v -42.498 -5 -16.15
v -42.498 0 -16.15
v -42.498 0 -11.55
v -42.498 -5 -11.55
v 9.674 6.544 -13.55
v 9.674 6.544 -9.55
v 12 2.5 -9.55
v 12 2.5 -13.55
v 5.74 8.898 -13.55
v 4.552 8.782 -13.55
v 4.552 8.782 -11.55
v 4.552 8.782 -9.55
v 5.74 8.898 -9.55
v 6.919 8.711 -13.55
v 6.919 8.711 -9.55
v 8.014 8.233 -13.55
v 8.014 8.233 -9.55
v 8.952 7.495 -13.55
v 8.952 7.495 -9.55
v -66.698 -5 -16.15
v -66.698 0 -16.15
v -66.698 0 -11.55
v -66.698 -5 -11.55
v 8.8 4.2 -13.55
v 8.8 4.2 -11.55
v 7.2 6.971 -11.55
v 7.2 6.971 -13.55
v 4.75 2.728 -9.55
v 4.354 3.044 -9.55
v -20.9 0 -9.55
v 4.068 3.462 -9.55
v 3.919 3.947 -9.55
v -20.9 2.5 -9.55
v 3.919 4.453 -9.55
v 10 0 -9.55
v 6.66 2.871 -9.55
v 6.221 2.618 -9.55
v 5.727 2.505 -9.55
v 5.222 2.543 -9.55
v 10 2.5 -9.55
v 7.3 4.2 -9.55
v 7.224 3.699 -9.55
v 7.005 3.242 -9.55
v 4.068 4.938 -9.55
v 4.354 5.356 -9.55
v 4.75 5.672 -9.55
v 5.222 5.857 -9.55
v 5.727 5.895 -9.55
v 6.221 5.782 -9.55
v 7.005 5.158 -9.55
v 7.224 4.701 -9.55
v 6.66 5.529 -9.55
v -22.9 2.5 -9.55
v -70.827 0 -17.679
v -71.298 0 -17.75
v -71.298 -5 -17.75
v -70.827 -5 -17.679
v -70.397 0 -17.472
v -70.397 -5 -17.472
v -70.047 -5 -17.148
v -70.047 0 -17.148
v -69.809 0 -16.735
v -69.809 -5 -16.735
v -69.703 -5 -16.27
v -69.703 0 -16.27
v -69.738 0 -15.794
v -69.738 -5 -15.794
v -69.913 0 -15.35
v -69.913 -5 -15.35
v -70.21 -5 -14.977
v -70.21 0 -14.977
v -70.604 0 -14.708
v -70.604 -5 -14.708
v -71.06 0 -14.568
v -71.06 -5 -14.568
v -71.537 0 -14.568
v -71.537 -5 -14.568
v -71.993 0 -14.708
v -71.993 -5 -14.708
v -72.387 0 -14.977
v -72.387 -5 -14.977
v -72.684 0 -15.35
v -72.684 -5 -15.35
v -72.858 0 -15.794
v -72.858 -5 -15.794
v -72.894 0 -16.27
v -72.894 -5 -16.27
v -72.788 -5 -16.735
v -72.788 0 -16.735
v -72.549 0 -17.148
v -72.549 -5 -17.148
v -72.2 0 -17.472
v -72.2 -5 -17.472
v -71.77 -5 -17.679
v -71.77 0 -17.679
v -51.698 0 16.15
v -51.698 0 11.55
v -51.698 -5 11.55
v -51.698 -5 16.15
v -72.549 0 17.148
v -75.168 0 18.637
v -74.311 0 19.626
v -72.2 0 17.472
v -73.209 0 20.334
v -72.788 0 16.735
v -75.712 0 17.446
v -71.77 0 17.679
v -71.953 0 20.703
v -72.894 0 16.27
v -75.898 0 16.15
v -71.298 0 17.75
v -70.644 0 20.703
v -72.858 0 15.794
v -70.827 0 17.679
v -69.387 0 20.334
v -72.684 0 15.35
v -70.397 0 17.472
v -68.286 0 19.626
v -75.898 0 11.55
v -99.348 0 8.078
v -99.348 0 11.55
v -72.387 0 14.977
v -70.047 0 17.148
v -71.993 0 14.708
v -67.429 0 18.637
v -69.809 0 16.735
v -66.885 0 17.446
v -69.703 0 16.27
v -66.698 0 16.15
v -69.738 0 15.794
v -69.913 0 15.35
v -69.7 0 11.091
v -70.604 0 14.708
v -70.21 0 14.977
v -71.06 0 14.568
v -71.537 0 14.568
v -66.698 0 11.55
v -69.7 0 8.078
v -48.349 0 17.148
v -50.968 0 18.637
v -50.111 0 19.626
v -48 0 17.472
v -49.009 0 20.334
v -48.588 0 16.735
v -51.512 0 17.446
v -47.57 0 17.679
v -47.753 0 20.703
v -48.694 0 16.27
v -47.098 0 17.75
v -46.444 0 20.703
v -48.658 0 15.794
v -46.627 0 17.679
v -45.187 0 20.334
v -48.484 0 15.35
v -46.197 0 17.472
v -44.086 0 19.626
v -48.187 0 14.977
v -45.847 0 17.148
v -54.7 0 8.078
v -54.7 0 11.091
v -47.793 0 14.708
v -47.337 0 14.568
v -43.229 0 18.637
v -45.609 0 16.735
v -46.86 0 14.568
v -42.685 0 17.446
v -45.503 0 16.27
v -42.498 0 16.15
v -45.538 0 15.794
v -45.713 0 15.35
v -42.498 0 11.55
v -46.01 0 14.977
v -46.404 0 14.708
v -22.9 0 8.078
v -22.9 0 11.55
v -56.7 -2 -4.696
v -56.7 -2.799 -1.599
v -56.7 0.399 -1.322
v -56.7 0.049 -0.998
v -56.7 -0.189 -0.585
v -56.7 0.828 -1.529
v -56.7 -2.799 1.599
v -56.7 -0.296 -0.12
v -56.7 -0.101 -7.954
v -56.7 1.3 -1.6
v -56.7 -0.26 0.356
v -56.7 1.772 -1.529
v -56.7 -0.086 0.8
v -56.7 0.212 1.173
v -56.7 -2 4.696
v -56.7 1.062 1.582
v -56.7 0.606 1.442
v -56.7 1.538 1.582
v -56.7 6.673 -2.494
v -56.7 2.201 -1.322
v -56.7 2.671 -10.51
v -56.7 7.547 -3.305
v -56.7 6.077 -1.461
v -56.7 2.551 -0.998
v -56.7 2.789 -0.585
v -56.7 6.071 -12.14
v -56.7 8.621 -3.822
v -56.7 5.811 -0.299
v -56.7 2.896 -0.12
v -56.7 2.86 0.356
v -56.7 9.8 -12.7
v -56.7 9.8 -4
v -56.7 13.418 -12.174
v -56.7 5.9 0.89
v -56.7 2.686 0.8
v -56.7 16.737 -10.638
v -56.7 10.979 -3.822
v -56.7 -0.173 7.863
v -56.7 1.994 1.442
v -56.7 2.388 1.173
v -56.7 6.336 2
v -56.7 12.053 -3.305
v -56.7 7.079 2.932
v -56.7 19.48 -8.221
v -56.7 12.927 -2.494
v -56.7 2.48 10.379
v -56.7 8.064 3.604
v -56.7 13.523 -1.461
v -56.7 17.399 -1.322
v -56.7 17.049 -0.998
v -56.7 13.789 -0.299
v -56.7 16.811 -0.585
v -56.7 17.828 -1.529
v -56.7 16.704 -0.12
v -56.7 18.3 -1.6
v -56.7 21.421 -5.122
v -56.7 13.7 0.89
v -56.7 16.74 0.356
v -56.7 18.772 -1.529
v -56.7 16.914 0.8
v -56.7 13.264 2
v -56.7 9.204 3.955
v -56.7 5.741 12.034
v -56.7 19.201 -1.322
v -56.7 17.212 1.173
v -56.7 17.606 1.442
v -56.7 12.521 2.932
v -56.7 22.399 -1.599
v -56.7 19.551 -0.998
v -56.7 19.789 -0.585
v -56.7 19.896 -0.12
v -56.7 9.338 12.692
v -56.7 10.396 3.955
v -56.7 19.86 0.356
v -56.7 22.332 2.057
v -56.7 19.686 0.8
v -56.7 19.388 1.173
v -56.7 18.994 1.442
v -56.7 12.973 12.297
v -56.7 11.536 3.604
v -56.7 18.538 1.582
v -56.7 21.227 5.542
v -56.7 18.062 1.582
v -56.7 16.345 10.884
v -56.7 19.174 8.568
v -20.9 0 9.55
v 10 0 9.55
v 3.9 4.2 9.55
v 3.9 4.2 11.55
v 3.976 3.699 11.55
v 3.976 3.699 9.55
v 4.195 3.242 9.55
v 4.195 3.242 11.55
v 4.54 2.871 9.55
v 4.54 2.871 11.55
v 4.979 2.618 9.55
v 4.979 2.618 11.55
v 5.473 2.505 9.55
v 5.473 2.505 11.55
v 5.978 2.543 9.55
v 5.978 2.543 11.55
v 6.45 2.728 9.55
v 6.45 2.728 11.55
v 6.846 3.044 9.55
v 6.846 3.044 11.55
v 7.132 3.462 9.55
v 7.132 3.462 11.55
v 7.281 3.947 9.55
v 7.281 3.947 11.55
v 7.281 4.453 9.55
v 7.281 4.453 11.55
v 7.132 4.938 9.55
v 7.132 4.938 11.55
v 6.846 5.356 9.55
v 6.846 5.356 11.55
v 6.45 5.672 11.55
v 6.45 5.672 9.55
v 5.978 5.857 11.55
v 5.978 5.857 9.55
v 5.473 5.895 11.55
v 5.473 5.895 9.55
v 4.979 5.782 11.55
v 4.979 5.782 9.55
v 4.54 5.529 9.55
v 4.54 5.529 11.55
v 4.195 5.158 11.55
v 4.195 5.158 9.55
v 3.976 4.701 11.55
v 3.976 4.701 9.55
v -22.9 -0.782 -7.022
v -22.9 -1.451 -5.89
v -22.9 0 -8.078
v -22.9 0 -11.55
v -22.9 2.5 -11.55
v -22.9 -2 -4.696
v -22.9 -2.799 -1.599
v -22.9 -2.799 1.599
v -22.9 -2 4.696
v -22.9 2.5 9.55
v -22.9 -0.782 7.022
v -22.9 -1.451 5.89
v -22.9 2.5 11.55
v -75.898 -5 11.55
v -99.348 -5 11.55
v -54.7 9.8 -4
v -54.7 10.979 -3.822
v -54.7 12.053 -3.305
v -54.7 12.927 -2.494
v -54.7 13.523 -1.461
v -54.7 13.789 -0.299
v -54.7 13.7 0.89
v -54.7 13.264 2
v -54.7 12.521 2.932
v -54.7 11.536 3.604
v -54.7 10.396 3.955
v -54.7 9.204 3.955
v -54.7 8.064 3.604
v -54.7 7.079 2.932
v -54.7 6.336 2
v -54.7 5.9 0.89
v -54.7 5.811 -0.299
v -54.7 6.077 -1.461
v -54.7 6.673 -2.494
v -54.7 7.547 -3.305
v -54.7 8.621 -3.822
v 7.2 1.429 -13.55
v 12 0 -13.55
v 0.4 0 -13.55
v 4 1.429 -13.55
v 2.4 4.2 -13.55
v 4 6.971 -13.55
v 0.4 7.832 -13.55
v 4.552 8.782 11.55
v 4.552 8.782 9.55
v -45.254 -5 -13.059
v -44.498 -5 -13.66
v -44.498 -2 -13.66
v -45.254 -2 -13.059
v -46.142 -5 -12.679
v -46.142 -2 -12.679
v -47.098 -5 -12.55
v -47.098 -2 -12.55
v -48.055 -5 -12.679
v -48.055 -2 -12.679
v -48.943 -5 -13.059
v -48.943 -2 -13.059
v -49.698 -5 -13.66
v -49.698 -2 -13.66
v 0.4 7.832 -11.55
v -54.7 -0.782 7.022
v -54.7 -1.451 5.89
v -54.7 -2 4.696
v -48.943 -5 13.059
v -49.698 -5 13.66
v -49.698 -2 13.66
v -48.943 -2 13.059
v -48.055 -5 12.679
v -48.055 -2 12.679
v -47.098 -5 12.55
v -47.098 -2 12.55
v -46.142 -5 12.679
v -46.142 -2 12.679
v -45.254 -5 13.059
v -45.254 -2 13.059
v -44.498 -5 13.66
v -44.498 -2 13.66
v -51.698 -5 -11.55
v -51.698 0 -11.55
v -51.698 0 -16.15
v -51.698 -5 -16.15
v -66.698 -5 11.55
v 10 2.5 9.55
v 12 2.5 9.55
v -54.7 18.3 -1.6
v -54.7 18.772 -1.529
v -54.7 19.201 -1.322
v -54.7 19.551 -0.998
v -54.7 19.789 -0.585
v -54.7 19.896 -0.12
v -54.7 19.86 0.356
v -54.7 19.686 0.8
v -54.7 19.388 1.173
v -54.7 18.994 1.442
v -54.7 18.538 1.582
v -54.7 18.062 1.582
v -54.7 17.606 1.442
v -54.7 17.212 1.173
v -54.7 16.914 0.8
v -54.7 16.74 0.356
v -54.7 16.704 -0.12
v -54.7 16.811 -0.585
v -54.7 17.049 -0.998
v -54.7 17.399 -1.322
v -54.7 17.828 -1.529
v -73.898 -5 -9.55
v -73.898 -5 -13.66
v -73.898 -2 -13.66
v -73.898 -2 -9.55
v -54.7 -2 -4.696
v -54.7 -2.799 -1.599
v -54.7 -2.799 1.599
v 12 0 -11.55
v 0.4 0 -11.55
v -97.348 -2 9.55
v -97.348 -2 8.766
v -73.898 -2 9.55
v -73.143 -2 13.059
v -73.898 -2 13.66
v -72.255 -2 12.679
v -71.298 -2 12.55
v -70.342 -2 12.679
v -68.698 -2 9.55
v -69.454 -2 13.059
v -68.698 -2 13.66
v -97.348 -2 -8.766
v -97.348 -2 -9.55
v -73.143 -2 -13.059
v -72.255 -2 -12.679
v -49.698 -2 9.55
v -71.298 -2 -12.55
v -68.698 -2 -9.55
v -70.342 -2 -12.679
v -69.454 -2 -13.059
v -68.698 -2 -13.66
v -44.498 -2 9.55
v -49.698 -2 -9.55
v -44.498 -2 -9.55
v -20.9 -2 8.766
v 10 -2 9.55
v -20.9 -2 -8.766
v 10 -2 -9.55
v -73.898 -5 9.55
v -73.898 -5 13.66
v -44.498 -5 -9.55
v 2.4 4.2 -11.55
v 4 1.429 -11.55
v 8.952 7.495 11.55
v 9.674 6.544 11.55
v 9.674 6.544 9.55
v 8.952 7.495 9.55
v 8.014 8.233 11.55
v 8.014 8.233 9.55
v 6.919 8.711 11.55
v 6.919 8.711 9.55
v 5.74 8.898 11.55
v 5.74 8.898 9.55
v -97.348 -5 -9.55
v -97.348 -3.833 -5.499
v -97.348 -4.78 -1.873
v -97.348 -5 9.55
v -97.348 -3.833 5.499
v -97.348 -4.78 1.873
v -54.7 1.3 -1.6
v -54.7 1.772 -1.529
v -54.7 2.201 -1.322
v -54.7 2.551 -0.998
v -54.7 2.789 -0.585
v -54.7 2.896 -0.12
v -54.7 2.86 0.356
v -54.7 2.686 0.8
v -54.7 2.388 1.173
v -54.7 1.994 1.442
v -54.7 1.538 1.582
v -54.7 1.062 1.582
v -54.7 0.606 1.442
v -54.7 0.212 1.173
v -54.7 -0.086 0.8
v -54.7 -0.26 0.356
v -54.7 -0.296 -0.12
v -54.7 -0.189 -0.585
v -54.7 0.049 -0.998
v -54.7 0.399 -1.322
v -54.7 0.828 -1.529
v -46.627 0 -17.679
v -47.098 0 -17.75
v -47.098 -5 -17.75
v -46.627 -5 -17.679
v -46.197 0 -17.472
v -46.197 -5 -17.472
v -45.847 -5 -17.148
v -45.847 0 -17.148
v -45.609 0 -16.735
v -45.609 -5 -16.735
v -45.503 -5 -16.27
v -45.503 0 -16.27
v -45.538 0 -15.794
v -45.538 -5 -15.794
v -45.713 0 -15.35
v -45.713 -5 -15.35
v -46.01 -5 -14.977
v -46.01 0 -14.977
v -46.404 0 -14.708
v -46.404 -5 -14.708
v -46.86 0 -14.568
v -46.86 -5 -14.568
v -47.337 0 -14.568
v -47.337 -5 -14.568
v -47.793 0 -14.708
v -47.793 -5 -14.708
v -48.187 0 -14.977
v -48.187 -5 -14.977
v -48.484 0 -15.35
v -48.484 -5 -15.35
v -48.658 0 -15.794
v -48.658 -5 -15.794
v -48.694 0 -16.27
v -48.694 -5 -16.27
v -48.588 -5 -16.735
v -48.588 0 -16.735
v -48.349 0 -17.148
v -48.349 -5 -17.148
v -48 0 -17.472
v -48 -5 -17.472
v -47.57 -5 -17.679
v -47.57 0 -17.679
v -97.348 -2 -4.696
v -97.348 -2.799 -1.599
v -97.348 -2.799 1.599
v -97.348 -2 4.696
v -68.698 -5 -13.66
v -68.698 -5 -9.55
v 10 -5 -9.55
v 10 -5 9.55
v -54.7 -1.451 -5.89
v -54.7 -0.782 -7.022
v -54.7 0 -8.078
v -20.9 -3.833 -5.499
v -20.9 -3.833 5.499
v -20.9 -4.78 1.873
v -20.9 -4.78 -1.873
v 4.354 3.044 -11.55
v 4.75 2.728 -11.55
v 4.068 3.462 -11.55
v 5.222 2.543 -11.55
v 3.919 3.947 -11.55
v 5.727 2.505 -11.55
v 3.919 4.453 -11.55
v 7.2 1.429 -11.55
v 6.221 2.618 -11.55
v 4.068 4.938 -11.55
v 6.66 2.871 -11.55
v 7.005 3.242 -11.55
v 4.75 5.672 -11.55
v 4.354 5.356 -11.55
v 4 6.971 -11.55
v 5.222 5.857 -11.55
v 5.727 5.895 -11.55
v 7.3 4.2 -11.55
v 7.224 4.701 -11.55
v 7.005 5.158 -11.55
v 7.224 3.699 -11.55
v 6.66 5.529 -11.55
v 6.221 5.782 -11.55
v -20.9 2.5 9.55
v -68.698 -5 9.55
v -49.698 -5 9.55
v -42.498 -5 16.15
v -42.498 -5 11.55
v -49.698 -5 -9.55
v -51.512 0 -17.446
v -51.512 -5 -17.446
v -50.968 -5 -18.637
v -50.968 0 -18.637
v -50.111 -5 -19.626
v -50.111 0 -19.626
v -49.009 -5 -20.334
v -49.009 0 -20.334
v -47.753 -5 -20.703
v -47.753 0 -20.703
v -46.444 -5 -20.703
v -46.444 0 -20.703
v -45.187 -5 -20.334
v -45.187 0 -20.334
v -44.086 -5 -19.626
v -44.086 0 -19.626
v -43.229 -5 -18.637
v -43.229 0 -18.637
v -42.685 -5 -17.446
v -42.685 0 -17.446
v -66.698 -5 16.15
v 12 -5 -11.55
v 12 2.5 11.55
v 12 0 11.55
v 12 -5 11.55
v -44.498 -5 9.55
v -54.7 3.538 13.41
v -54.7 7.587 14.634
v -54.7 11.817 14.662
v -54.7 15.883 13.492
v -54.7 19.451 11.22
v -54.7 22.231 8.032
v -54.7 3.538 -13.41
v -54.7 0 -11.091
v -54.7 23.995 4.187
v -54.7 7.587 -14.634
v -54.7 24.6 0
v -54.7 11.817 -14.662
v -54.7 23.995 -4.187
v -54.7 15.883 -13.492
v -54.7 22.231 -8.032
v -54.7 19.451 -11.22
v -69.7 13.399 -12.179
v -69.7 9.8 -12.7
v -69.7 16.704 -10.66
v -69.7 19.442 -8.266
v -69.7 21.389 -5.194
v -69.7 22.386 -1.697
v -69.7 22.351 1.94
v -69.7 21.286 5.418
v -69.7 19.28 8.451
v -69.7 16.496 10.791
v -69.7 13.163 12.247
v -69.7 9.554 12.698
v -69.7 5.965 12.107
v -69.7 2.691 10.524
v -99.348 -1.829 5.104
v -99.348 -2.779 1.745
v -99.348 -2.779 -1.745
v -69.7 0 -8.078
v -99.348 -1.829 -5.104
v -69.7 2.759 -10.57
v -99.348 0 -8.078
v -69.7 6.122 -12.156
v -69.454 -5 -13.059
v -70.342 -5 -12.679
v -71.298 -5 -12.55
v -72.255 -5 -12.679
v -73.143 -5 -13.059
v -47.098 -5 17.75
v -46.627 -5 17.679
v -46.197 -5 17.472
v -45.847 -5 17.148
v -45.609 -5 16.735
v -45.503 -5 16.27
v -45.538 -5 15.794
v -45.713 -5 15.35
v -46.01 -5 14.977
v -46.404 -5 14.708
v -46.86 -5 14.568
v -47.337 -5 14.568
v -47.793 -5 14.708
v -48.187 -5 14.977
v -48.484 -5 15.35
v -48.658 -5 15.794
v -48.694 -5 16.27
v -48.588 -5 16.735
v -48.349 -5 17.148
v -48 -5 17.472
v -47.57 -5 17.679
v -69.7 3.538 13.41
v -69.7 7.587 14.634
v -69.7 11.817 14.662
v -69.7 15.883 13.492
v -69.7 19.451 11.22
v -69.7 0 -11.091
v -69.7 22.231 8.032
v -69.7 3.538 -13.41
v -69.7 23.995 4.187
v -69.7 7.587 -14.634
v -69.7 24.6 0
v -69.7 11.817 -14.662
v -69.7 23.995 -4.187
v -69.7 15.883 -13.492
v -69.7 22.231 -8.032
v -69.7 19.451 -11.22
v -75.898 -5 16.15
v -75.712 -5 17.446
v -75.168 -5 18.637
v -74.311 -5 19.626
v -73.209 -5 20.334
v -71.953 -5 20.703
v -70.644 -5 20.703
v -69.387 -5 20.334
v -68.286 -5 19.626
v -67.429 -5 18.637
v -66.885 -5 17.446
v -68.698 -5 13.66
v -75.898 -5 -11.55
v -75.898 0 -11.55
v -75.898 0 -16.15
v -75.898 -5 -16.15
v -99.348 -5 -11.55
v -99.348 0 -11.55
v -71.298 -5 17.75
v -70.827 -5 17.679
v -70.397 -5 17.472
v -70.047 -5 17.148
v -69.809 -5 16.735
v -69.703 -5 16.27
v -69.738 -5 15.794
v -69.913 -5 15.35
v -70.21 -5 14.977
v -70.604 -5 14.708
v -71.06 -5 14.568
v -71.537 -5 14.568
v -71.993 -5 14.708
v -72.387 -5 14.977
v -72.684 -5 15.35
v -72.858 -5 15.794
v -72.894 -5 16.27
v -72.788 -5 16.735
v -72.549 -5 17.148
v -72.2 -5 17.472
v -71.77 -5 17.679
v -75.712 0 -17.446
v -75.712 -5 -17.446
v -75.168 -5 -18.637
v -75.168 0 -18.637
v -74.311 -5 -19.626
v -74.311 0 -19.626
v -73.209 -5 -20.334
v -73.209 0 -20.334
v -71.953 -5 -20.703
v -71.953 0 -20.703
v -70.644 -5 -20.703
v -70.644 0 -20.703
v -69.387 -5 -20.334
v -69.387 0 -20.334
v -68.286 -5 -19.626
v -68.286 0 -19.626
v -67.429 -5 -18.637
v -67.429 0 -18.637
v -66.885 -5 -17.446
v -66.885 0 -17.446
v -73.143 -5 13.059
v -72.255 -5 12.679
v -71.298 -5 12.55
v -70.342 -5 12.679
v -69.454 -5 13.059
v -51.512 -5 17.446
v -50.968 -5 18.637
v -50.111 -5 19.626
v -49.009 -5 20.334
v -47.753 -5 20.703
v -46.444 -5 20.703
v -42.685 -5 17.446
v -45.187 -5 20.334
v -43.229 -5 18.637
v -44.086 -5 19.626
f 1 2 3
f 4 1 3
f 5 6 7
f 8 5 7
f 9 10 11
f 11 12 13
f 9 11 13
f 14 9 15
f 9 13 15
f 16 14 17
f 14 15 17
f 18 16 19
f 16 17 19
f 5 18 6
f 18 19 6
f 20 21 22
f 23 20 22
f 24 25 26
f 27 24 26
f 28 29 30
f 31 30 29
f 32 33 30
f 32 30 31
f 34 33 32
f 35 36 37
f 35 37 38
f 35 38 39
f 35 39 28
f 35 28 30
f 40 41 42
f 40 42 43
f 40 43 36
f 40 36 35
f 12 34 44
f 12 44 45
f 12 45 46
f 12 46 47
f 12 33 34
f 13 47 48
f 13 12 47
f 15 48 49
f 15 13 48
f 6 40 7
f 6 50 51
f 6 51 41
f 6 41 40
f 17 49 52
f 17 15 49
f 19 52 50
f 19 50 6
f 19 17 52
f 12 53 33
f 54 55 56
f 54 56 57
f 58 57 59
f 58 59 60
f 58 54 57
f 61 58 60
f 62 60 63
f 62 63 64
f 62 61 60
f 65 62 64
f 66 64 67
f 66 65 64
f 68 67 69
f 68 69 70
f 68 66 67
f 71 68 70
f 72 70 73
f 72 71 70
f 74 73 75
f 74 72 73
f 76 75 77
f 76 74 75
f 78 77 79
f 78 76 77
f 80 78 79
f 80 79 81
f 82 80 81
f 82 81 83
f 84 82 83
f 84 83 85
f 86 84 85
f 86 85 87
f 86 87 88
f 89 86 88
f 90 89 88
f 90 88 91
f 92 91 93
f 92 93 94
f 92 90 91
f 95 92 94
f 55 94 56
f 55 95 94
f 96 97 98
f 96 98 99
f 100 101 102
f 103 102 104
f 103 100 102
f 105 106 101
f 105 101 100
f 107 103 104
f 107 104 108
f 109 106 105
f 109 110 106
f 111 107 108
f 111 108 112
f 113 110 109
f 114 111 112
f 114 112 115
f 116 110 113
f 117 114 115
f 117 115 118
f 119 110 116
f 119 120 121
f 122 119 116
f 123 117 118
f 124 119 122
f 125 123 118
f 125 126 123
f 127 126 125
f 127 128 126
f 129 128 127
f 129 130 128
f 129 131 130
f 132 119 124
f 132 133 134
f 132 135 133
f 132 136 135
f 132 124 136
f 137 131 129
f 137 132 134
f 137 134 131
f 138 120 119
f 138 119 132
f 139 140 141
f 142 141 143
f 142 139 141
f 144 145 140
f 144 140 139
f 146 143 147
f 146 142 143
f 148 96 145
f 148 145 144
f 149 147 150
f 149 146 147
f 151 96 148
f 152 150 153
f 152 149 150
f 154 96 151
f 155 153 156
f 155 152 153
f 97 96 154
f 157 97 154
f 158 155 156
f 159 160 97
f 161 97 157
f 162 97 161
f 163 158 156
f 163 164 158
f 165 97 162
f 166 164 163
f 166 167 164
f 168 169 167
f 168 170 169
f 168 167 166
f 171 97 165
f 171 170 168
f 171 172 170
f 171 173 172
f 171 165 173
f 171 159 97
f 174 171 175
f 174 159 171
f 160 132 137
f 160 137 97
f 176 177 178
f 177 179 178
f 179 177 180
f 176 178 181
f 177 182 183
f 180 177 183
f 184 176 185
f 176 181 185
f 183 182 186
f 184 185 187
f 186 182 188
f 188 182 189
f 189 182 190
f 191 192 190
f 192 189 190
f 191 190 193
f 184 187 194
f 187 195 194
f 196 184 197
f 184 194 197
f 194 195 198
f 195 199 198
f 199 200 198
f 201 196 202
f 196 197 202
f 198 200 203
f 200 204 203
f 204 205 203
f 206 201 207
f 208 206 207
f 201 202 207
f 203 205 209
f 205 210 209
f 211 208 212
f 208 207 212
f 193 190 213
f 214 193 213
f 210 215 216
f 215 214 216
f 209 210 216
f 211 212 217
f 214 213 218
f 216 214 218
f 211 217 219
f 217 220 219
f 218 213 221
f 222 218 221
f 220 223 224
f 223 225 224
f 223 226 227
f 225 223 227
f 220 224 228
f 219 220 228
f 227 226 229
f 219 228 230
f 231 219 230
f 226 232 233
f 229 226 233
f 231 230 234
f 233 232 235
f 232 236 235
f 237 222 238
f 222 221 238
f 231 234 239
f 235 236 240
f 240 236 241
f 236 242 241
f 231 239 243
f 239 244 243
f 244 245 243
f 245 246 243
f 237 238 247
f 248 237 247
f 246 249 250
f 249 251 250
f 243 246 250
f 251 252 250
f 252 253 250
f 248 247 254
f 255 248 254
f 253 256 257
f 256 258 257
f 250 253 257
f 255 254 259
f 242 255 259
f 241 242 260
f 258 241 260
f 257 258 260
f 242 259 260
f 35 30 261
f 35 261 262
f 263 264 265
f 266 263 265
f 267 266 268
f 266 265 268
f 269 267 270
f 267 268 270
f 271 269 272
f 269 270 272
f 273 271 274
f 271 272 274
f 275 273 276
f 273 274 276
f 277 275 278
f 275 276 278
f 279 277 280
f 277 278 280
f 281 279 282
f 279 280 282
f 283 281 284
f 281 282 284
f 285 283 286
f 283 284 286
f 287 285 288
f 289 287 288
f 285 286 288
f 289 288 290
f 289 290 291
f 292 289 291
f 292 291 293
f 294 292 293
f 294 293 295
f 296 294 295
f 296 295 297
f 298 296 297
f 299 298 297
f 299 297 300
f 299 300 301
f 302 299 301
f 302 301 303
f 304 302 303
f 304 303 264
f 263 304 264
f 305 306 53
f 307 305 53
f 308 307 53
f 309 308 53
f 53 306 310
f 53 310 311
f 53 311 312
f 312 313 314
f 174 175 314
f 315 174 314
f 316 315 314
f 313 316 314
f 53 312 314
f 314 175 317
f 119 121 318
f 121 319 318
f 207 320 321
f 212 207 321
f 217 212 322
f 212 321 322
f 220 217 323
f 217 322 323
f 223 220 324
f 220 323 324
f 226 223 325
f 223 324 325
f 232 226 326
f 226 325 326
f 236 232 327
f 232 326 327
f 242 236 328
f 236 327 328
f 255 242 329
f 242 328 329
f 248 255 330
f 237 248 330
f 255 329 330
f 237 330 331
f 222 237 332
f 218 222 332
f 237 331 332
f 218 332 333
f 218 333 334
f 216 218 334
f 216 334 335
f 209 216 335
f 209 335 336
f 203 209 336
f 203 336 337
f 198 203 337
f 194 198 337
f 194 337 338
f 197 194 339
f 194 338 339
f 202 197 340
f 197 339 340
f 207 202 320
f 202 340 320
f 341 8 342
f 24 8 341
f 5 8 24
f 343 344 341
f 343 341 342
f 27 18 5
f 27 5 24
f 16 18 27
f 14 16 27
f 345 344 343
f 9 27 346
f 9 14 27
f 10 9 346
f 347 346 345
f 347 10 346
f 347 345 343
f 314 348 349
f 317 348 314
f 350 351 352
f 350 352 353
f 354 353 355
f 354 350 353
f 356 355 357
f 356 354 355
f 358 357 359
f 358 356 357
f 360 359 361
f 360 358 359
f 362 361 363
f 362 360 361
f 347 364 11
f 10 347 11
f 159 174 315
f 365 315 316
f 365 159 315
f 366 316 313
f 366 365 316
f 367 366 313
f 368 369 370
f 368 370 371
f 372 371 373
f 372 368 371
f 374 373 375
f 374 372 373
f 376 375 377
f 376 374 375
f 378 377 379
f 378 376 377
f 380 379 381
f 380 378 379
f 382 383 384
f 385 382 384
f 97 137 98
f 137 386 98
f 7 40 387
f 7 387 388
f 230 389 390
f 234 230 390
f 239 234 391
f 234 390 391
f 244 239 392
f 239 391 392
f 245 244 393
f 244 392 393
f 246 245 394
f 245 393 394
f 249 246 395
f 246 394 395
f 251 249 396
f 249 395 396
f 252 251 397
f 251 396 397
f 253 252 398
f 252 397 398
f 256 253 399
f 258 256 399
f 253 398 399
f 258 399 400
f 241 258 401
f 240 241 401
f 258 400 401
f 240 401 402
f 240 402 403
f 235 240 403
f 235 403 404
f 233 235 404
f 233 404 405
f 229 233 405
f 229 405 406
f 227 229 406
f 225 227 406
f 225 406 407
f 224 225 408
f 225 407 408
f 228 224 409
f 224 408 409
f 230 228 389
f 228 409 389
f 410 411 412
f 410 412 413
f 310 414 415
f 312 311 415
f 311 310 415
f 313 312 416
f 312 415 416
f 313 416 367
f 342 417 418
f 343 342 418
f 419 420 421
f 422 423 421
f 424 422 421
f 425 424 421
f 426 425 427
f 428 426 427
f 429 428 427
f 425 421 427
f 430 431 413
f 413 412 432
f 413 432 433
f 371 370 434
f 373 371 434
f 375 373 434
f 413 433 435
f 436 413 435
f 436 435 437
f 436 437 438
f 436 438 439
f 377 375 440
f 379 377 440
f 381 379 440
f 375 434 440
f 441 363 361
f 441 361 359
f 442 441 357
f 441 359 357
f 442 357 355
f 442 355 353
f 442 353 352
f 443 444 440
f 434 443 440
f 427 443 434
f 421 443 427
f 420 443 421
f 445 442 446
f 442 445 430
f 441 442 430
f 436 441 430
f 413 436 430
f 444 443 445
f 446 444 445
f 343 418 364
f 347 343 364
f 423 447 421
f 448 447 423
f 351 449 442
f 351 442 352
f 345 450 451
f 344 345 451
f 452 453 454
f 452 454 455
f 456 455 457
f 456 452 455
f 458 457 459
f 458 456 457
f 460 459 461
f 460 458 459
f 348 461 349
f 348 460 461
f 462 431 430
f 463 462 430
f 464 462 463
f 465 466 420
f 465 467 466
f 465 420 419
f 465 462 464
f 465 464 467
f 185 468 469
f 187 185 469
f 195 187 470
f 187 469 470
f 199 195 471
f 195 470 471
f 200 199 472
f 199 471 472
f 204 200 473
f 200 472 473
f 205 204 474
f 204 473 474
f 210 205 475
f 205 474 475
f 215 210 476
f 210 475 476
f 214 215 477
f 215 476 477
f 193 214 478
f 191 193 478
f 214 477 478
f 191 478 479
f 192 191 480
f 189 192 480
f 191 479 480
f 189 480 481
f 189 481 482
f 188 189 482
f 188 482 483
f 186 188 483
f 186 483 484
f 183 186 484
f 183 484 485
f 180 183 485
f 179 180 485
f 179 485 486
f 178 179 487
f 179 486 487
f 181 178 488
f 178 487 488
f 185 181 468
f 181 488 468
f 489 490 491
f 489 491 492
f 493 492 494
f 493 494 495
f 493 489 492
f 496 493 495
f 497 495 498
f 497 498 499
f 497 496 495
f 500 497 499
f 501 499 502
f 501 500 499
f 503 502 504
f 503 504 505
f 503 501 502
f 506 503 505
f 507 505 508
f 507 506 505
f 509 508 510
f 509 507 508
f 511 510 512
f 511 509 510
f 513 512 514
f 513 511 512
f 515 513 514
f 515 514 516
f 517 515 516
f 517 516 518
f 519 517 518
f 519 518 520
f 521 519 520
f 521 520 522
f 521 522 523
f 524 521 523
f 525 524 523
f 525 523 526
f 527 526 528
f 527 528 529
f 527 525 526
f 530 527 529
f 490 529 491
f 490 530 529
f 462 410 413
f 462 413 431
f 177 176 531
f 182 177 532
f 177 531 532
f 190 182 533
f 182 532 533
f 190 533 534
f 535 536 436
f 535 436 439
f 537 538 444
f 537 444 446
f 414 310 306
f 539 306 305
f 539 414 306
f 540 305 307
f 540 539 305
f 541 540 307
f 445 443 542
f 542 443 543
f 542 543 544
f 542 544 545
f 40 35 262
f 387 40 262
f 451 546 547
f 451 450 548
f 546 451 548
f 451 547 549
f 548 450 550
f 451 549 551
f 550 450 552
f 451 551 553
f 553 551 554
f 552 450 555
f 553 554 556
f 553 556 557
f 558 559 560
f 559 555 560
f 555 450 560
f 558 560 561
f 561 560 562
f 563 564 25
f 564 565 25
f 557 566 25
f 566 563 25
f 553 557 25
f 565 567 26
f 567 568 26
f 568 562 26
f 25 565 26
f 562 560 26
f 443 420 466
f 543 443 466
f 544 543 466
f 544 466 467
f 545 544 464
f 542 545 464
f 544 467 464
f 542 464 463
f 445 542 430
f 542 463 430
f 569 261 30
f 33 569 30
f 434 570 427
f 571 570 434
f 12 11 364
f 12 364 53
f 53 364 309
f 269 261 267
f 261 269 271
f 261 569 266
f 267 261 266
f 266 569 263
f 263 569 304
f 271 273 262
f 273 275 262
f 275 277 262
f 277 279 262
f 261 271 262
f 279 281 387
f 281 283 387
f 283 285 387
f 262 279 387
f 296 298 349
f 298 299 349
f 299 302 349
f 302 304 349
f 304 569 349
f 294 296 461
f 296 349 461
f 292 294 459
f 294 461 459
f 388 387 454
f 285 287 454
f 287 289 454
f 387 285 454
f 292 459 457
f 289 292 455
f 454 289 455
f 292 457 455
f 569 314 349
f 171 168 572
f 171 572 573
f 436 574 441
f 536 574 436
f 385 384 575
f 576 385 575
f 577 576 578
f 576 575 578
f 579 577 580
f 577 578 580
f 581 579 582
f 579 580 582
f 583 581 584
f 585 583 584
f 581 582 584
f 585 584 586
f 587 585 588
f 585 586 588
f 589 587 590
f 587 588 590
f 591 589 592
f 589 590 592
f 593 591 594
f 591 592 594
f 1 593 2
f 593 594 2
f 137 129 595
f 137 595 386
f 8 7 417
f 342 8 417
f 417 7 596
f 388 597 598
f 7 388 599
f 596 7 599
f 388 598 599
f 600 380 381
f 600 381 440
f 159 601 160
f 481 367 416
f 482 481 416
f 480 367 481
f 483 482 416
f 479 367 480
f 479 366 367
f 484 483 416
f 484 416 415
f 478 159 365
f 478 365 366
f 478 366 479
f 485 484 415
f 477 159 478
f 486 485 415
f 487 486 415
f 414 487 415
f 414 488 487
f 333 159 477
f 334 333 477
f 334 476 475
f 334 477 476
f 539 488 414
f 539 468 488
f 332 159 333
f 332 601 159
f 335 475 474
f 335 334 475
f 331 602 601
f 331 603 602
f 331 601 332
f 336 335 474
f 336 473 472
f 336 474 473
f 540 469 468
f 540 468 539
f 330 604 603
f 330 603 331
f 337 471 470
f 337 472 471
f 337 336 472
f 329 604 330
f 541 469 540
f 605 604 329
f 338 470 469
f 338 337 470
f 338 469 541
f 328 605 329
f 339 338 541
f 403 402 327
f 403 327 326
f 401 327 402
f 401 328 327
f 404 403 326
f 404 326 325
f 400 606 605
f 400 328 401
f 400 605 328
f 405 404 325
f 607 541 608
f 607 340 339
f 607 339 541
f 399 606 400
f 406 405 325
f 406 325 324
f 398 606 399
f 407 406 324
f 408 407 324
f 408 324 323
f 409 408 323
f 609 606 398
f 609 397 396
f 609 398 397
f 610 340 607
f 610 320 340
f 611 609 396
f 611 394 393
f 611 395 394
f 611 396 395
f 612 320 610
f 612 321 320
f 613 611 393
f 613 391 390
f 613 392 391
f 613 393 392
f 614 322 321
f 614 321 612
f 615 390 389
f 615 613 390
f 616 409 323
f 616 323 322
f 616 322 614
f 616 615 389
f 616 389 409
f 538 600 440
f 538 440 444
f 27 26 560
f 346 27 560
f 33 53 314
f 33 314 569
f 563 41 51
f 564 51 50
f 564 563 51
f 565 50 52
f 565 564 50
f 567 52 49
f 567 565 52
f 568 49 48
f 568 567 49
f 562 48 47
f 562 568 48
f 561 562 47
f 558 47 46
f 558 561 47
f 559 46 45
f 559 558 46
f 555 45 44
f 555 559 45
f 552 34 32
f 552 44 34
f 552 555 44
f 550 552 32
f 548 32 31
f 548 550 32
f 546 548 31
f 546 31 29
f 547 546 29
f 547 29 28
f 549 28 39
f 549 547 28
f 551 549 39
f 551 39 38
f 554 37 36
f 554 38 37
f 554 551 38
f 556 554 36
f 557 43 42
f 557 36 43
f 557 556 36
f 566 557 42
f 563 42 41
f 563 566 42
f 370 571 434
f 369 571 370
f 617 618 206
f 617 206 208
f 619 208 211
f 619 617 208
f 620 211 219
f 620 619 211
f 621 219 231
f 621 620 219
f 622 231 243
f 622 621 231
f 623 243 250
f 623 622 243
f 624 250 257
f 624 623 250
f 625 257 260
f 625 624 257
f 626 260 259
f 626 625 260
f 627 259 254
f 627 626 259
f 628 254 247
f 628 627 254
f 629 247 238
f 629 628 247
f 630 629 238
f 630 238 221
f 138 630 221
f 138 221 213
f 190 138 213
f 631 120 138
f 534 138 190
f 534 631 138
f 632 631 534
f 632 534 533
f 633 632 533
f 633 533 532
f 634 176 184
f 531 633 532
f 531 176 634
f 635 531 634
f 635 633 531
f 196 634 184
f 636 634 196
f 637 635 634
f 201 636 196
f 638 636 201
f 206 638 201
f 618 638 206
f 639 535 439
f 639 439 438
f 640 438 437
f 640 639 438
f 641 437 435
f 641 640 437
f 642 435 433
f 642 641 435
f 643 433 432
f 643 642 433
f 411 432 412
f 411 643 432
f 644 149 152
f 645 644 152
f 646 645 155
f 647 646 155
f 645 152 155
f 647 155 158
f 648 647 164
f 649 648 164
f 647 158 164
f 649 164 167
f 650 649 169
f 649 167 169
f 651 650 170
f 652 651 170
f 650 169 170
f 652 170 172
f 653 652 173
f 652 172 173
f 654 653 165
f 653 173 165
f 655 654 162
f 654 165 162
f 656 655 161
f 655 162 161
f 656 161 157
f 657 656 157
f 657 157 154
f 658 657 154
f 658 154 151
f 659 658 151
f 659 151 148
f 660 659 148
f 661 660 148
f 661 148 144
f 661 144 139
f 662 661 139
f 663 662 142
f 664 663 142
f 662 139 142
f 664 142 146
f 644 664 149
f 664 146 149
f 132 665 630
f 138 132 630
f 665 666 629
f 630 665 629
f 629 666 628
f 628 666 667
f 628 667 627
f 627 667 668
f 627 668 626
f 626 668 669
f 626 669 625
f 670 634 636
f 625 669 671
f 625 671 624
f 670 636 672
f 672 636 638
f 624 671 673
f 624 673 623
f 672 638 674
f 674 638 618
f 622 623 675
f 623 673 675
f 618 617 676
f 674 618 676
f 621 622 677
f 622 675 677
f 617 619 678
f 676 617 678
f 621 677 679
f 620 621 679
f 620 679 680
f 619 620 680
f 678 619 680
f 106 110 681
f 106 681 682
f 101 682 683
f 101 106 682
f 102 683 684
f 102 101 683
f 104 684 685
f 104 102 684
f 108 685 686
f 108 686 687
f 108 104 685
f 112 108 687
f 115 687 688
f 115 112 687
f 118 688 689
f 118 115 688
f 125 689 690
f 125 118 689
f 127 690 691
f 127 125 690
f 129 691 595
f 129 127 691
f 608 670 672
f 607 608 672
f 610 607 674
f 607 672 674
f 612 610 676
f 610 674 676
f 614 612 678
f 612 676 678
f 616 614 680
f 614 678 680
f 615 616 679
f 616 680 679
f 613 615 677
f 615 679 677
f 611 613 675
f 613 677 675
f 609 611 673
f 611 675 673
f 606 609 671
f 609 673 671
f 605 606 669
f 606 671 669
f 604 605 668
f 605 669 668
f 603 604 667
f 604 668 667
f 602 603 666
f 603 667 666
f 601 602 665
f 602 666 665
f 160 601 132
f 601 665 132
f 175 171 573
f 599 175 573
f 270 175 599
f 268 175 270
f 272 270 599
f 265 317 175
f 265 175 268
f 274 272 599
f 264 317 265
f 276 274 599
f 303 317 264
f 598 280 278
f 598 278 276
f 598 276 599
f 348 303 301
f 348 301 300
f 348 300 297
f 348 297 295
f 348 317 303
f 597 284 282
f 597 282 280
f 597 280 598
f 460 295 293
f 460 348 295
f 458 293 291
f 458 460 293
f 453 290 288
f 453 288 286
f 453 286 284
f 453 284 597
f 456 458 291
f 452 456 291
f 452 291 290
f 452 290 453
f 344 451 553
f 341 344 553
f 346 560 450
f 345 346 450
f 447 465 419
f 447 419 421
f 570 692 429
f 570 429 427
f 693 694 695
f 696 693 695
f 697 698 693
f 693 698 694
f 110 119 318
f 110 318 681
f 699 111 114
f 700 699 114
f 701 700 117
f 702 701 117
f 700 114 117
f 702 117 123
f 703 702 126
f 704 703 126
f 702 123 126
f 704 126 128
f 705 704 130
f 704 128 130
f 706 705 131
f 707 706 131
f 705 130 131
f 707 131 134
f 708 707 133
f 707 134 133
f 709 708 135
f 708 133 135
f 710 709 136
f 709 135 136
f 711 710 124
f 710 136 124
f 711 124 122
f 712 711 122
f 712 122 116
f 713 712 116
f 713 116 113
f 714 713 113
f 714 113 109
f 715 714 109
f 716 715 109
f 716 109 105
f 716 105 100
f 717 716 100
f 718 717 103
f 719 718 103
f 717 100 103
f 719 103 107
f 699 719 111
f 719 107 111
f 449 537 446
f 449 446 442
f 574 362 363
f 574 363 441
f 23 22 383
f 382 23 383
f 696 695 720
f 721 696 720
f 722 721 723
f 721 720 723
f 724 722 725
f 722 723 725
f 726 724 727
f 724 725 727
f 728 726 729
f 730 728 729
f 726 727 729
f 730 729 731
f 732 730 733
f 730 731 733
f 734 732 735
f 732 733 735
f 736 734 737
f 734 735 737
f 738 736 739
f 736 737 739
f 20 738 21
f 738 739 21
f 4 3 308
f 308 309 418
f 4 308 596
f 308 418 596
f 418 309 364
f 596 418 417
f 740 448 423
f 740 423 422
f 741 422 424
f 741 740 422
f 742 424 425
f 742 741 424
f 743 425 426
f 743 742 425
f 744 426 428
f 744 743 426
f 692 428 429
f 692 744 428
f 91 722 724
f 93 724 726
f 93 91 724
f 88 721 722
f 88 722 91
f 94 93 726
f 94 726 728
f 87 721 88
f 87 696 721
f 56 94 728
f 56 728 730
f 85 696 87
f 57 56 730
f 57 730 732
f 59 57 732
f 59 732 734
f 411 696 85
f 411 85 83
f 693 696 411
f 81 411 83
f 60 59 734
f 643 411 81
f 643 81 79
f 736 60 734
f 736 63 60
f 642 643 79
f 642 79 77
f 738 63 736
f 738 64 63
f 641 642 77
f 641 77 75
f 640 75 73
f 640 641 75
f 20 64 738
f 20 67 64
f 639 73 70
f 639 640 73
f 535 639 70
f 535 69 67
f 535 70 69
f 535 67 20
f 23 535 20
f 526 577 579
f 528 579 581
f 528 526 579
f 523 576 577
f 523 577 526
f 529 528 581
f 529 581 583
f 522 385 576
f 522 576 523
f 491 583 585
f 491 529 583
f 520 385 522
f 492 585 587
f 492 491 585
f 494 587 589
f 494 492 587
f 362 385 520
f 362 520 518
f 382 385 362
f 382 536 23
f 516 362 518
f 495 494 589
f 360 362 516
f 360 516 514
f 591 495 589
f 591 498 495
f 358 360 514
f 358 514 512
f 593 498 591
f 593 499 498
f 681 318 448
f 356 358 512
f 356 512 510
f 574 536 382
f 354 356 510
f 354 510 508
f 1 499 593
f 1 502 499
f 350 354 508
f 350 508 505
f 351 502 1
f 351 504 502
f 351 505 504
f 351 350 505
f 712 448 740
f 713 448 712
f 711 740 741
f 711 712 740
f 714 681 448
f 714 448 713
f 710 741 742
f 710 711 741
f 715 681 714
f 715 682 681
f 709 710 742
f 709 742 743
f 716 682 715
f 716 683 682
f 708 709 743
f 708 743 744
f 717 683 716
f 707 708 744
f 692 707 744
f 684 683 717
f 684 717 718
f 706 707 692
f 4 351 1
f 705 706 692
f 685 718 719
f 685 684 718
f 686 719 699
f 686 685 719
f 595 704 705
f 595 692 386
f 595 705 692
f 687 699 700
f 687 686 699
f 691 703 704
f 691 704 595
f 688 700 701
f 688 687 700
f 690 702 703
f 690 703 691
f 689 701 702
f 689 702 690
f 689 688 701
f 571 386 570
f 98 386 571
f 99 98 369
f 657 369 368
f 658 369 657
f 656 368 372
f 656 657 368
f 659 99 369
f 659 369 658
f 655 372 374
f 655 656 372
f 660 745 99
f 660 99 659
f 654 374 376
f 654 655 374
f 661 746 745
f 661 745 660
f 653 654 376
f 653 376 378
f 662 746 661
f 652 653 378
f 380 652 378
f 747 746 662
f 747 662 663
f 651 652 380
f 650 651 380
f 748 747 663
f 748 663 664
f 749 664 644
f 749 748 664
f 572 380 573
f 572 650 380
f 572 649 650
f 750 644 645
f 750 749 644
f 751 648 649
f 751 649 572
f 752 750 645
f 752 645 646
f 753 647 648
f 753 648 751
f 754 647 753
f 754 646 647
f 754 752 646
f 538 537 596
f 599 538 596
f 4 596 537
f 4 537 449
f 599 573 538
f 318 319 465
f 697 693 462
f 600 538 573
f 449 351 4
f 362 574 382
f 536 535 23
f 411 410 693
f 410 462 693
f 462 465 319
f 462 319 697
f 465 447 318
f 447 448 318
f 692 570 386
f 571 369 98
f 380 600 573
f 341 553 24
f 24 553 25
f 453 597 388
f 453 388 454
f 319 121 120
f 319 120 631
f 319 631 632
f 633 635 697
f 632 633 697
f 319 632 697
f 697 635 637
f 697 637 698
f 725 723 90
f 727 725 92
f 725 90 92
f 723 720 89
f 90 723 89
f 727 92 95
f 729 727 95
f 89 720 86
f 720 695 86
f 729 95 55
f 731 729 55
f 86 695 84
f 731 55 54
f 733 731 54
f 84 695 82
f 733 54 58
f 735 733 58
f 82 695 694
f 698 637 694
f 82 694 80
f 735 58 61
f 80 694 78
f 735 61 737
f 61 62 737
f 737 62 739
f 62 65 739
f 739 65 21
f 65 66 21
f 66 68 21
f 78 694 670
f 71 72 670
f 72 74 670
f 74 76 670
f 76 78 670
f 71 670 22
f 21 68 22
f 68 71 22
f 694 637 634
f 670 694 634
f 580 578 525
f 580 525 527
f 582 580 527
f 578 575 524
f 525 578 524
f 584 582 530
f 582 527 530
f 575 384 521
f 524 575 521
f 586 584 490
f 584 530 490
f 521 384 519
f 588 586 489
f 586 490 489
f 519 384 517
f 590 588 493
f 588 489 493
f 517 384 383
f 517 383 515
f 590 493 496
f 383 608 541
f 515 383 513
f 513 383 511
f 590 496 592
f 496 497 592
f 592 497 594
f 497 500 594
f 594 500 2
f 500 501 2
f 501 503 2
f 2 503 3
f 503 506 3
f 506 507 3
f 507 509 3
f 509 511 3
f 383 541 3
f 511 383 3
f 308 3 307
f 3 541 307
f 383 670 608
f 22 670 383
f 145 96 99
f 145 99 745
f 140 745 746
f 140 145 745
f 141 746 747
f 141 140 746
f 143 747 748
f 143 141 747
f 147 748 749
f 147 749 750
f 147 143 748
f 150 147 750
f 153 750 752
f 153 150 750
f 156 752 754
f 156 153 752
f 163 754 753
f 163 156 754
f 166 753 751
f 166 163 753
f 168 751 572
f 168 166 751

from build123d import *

# Parameters (mm, degrees)
SKETCH3_W                = 111.348371095
SKETCH3_H                = 23.1
BOSS_EXTRUDE1_DEPTH      = 5
SKETCH3_4_W              = 34.9
SKETCH3_4_H              = 23.1
BOSS_EXTRUDE2_DEPTH      = 2.5
CUT_EXTRUDE1_DEPTH       = 30.8
CUT_EXTRUDE1_DEPTH_BACK  = 67.894637304
SKETCH4_4_R              = 12.7
BOSS_EXTRUDE3_START      = -1
SKETCH4_R                = 12.7
SKETCH4_R_2              = 4
SKETCH4_R_3              = 1.6
BOSS_EXTRUDE3_DEPTH      = 2
BOSS_EXTRUDE4_DEPTH      = 2
BOSS_EXTRUDE4_DEPTH_BACK = 13
BOSS_EXTRUDE4_START      = -3
SKETCH4_3_R              = 14.8
SKETCH4_3_R_2            = 12.7
SKETCH5_R                = 4.6
SKETCH5_R_2              = 1.6
BOSS_EXTRUDE5_DEPTH      = 5
BOSS_EXTRUDE6_START      = 11.55
SKETCH6_R                = 1.7
BOSS_EXTRUDE6_DEPTH      = 2
BOSS_EXTRUDE7_START      = -11.55
BOSS_EXTRUDE7_OUTLINE_R  = 1.7
BOSS_EXTRUDE7_DEPTH      = 2
BOSS_EXTRUDE8_DEPTH      = 2
SHELL1_START             = -5
SHELL1_DEPTH             = 0.1
SHELL1_START_2           = -4.9
SHELL1_2_DEPTH           = 2.9
SHELL1_START_3           = -97.348371095
SHELL1_3_DEPTH           = 76.448371095
SHELL1_START_4           = -56.7
SHELL1_4_DEPTH           = 2
SHELL1_START_5           = -22.9
SHELL1_5_DEPTH           = 2


with BuildPart() as part:
    # Sketch3 → Boss-Extrude1 (new body)
    with BuildSketch(Plane(origin=(0, 0, 0), x_dir=(1, 0, 0), z_dir=(0, 1, 0))):
        with Locations((-43.674185548, 0)):
            Rectangle(SKETCH3_W, SKETCH3_H)
    extrude(amount=-BOSS_EXTRUDE1_DEPTH)

    # Sketch3<4> → Boss-Extrude2 (add)
    with BuildSketch(Plane(origin=(0, 0, 0), x_dir=(1, 0, 0), z_dir=(0, 1, 0))):
        with Locations((-5.45, 0)):
            Rectangle(SKETCH3_4_W, SKETCH3_4_H)
        Polygon((-20.2, 9.55), (9.3, 9.55), (10, 9.55), (10, -9.55), (9.3, -9.55), (-20.2, -9.55), (-20.9, -9.55), (-20.9, 9.55), align=None, mode=Mode.SUBTRACT)
    extrude(amount=BOSS_EXTRUDE2_DEPTH)

    # Sketch4<4> → Cut-Extrude1 (cut, two sides: drawn at the far end of the back side and taken through both)
    with BuildSketch(Plane(origin=(-53.7, 0, 0), x_dir=(0, 0, -1), z_dir=(1, 0, 0)).offset(-CUT_EXTRUDE1_DEPTH_BACK)):
        with Locations((0, 9.8)):
            Circle(SKETCH4_4_R)
    extrude(amount=CUT_EXTRUDE1_DEPTH + CUT_EXTRUDE1_DEPTH_BACK, mode=Mode.SUBTRACT)

    # Sketch4 → Boss-Extrude3 (add)
    with BuildSketch(Plane(origin=(-53.7, 0, 0), x_dir=(0, 0, -1), z_dir=(1, 0, 0)).offset(BOSS_EXTRUDE3_START)):
        with Locations((0, 9.8)):
            Circle(SKETCH4_R)
        with Locations((0, 9.8)):
            Circle(SKETCH4_R_2, mode=Mode.SUBTRACT)
        with Locations((0, 18.3)):
            Circle(SKETCH4_R_3, mode=Mode.SUBTRACT)
        with Locations((0, 1.3)):
            Circle(SKETCH4_R_3, mode=Mode.SUBTRACT)
    extrude(amount=-BOSS_EXTRUDE3_DEPTH)

    # Sketch4<3> → Boss-Extrude4 (add, two sides: drawn at the far end of the back side and taken through both)
    with BuildSketch(Plane(origin=(-53.7, 0, 0), x_dir=(0, 0, -1), z_dir=(1, 0, 0)).offset(BOSS_EXTRUDE4_START - BOSS_EXTRUDE4_DEPTH_BACK)):
        with Locations((0, 9.8)):
            Circle(SKETCH4_3_R)
        with Locations((0, 9.8)):
            Circle(SKETCH4_3_R_2, mode=Mode.SUBTRACT)
    extrude(amount=BOSS_EXTRUDE4_DEPTH + BOSS_EXTRUDE4_DEPTH_BACK)

    # Sketch5 → Boss-Extrude5 (add)
    # profile 1 of 6: a face of its own
    with BuildSketch(Plane(origin=(0, 0, 0), x_dir=(1, 0, 0), z_dir=(0, 1, 0))):
        with Locations((-47.098371095, -16.15)):
            Circle(SKETCH5_R)
        with Locations(Location((-47.098371095, -16.15, 0), (0, 0, 270))):
            Circle(SKETCH5_R_2, mode=Mode.SUBTRACT)
    # profile 2 of 6: a face of its own
    with BuildSketch(Plane(origin=(0, 0, 0), x_dir=(1, 0, 0), z_dir=(0, 1, 0))):
        with BuildLine():
            Line((-51.698371095, -11.55), (-51.698371095, -16.15))
            ThreePointArc((-51.698371095, -16.15), (-50.351062288, -12.897308807), (-47.098371095, -11.55))
            Line((-47.098371095, -11.55), (-51.698371095, -11.55))
        make_face()
    # profile 3 of 6: a face of its own
    with BuildSketch(Plane(origin=(0, 0, 0), x_dir=(1, 0, 0), z_dir=(0, 1, 0))):
        with BuildLine():
            ThreePointArc((-47.098371095, -11.55), (-43.845679901, -12.897308807), (-42.498371095, -16.15))
            Line((-42.498371095, -16.15), (-42.498371095, -11.55))
            Line((-42.498371095, -11.55), (-47.098371095, -11.55))
        make_face()
    # profile 4 of 6: a face of its own
    with BuildSketch(Plane(origin=(0, 0, 0), x_dir=(1, 0, 0), z_dir=(0, 1, 0))):
        with Locations((-71.298371095, -16.15)):
            Circle(SKETCH5_R)
        with Locations(Location((-71.298371095, -16.15, 0), (0, 0, 270))):
            Circle(SKETCH5_R_2, mode=Mode.SUBTRACT)
    # profile 5 of 6: a face of its own
    with BuildSketch(Plane(origin=(0, 0, 0), x_dir=(1, 0, 0), z_dir=(0, 1, 0))):
        with BuildLine():
            ThreePointArc((-75.898371095, -16.15), (-74.551062288, -12.897308807), (-71.298371095, -11.55))
            Line((-71.298371095, -11.55), (-75.898371095, -11.55))
            Line((-75.898371095, -11.55), (-75.898371095, -16.15))
        make_face()
    # profile 6 of 6: a face of its own
    with BuildSketch(Plane(origin=(0, 0, 0), x_dir=(1, 0, 0), z_dir=(0, 1, 0))):
        with BuildLine():
            Line((-66.698371095, -16.15), (-66.698371095, -11.55))
            Line((-66.698371095, -11.55), (-71.298371095, -11.55))
            ThreePointArc((-71.298371095, -11.55), (-68.045679901, -12.897308807), (-66.698371095, -16.15))
        make_face()
    boss_extrude5 = extrude(amount=-BOSS_EXTRUDE5_DEPTH)

    # Sketch6 → Boss-Extrude6 (add)
    with BuildSketch(Plane.XY.offset(BOSS_EXTRUDE6_START)):
        with BuildLine():
            Line((4.55162483, 8.781583733), (-22.9, 2.5))
            Line((-22.9, 2.5), (1.21821954, 2.5))
            ThreePointArc((1.21821954, 2.5), (5.6, -0.5), (9.98178046, 2.5))
            Line((9.98178046, 2.5), (12, 2.5))
            Line((12, 2.5), (9.674058028, 6.543512575))
            ThreePointArc((9.674058028, 6.543512575), (7.481735852, 8.506863149), (4.55162483, 8.781583733))
        make_face()
        with Locations(Location((5.6, 4.2, 0), (0, 0, 180))):
            Circle(SKETCH6_R, mode=Mode.SUBTRACT)
    extrude(amount=-BOSS_EXTRUDE6_DEPTH)

    # Boss-Extrude7: read off the stored shape, not the designer's step
    # Boss-Extrude7 outline → Boss-Extrude7 (add)
    with BuildSketch(Plane.XY.offset(BOSS_EXTRUDE7_START)):
        with BuildLine():
            Line((4.55162483, 8.781583733), (-22.9, 2.5))
            Line((-22.9, 2.5), (-20.9, 2.5))
            Line((-20.9, 2.5), (-20.9, 0))
            Line((-20.9, 0), (10, 0))
            Line((10, 0), (10, 2.5))
            Line((10, 2.5), (12, 2.5))
            Line((12, 2.5), (9.674058028, 6.543512575))
            ThreePointArc((9.674058028, 6.543512575), (7.481735852, 8.506863149), (4.55162483, 8.781583733))
        make_face()
        with Locations((5.6, 4.2)):
            Circle(BOSS_EXTRUDE7_OUTLINE_R, mode=Mode.SUBTRACT)
    extrude(amount=BOSS_EXTRUDE7_DEPTH)

    # Mirror1: Boss-Extrude5 across plane
    add(boss_extrude5.mirror(Plane.XY))

    # Sketch7 → Boss-Extrude8 (add)
    with BuildSketch(Plane(origin=(0, 0, -11.55), x_dir=(-1, 0, 0), z_dir=(0, 0, -1))):
        with BuildLine():
            Line((-12, 0), (-0.4, 0))
            Line((-0.4, 0), (-0.4, 7.831593371))
            Line((-0.4, 7.831593371), (-4.55162483, 8.781583733))
            ThreePointArc((-4.55162483, 8.781583733), (-7.481735852, 8.506863149), (-9.674058028, 6.543512575))
            Line((-9.674058028, 6.543512575), (-12, 2.5))
            Line((-12, 2.5), (-12, 0))
        make_face()
        Polygon((-7.2, 6.971281292), (-4, 6.971281292), (-2.4, 4.2), (-4, 1.428718708), (-7.2, 1.428718708), (-8.8, 4.2), align=None, mode=Mode.SUBTRACT)
    extrude(amount=BOSS_EXTRUDE8_DEPTH)

    # Shell1: read off the stored shape, not the designer's step
    # Shell1 outline → Shell1 (cut)
    with BuildSketch(Plane(origin=(0, 0, 0), x_dir=(1, 0, 0), z_dir=(0, 1, 0)).offset(SHELL1_START)):
        with BuildLine():
            Line((10, -9.55), (10, 9.55))
            Line((10, 9.55), (-44.498371095, 9.55))
            Line((-44.498371095, 9.55), (-44.498371095, 13.66002008))
            ThreePointArc((-44.498371095, 13.66002008), (-47.098371095, 12.55), (-49.698371095, 13.66002008))
            Line((-49.698371095, 13.66002008), (-49.698371095, 9.55))
            Line((-49.698371095, 9.55), (-68.698371095, 9.55))
            Line((-68.698371095, 9.55), (-68.698371095, 13.66002008))
            ThreePointArc((-68.698371095, 13.66002008), (-71.298371095, 12.55), (-73.898371095, 13.66002008))
            Line((-73.898371095, 13.66002008), (-73.898371095, 9.55))
            Line((-73.898371095, 9.55), (-97.348371095, 9.55))
            Line((-97.348371095, 9.55), (-97.348371095, -9.55))
            Line((-97.348371095, -9.55), (-73.898371095, -9.55))
            Line((-73.898371095, -9.55), (-73.898371095, -13.66002008))
            ThreePointArc((-73.898371095, -13.66002008), (-71.298371095, -12.55), (-68.698371095, -13.66002008))
            Line((-68.698371095, -13.66002008), (-68.698371095, -9.55))
            Line((-68.698371095, -9.55), (-49.698371095, -9.55))
            Line((-49.698371095, -9.55), (-49.698371095, -13.66002008))
            ThreePointArc((-49.698371095, -13.66002008), (-47.098371095, -12.55), (-44.498371095, -13.66002008))
            Line((-44.498371095, -13.66002008), (-44.498371095, -9.55))
            Line((-44.498371095, -9.55), (10, -9.55))
        make_face()
    extrude(amount=SHELL1_DEPTH, mode=Mode.SUBTRACT)

    # Shell1 2 outline → Shell1 2 (cut)
    with BuildSketch(Plane(origin=(0, 0, 0), x_dir=(1, 0, 0), z_dir=(0, 1, 0)).offset(SHELL1_START_2)):
        with BuildLine():
            Line((10, -9.55), (10, 9.55))
            Line((10, 9.55), (-44.498371095, 9.55))
            Line((-44.498371095, 9.55), (-44.498371095, 13.66002008))
            ThreePointArc((-44.498371095, 13.66002008), (-47.098371095, 12.55), (-49.698371095, 13.66002008))
            Line((-49.698371095, 13.66002008), (-49.698371095, 9.55))
            Line((-49.698371095, 9.55), (-68.698371095, 9.55))
            Line((-68.698371095, 9.55), (-68.698371095, 13.66002008))
            ThreePointArc((-68.698371095, 13.66002008), (-71.298371095, 12.55), (-73.898371095, 13.66002008))
            Line((-73.898371095, 13.66002008), (-73.898371095, 9.55))
            Line((-73.898371095, 9.55), (-97.348371095, 9.55))
            Line((-97.348371095, 9.55), (-97.348371095, -9.55))
            Line((-97.348371095, -9.55), (-73.898371095, -9.55))
            Line((-73.898371095, -9.55), (-73.898371095, -13.66002008))
            ThreePointArc((-73.898371095, -13.66002008), (-71.298371095, -12.55), (-68.698371095, -13.66002008))
            Line((-68.698371095, -13.66002008), (-68.698371095, -9.55))
            Line((-68.698371095, -9.55), (-49.698371095, -9.55))
            Line((-49.698371095, -9.55), (-49.698371095, -13.66002008))
            ThreePointArc((-49.698371095, -13.66002008), (-47.098371095, -12.55), (-44.498371095, -13.66002008))
            Line((-44.498371095, -13.66002008), (-44.498371095, -9.55))
            Line((-44.498371095, -9.55), (10, -9.55))
        make_face()
    extrude(amount=SHELL1_2_DEPTH, mode=Mode.SUBTRACT)

    # Shell1 3 outline → Shell1 3 (add)
    with BuildSketch(Plane.YZ.offset(SHELL1_START_3)):
        with BuildLine():
            ThreePointArc((-2, -4.695742753), (-2.9, 0), (-2, 4.695742753))
            Line((-2, 4.695742753), (-2, 8.766413178))
            ThreePointArc((-2, 8.766413178), (-4.9, 0), (-2, -8.766413178))
            Line((-2, -8.766413178), (-2, -4.695742753))
        make_face()
    extrude(amount=SHELL1_3_DEPTH)

    # Shell1 4 outline → Shell1 4 (add)
    with BuildSketch(Plane.YZ.offset(SHELL1_START_4)):
        with BuildLine():
            Line((-2, -4.695742753), (-2, 4.695742753))
            ThreePointArc((-2, 4.695742753), (-2.9, 0), (-2, -4.695742753))
        make_face()
    extrude(amount=SHELL1_4_DEPTH)

    # Shell1 5 outline → Shell1 5 (add)
    with BuildSketch(Plane.YZ.offset(SHELL1_START_5)):
        with BuildLine():
            Line((-2, -4.695742753), (-2, 4.695742753))
            ThreePointArc((-2, 4.695742753), (-2.9, 0), (-2, -4.695742753))
        make_face()
    extrude(amount=SHELL1_5_DEPTH)


solid = part.part
